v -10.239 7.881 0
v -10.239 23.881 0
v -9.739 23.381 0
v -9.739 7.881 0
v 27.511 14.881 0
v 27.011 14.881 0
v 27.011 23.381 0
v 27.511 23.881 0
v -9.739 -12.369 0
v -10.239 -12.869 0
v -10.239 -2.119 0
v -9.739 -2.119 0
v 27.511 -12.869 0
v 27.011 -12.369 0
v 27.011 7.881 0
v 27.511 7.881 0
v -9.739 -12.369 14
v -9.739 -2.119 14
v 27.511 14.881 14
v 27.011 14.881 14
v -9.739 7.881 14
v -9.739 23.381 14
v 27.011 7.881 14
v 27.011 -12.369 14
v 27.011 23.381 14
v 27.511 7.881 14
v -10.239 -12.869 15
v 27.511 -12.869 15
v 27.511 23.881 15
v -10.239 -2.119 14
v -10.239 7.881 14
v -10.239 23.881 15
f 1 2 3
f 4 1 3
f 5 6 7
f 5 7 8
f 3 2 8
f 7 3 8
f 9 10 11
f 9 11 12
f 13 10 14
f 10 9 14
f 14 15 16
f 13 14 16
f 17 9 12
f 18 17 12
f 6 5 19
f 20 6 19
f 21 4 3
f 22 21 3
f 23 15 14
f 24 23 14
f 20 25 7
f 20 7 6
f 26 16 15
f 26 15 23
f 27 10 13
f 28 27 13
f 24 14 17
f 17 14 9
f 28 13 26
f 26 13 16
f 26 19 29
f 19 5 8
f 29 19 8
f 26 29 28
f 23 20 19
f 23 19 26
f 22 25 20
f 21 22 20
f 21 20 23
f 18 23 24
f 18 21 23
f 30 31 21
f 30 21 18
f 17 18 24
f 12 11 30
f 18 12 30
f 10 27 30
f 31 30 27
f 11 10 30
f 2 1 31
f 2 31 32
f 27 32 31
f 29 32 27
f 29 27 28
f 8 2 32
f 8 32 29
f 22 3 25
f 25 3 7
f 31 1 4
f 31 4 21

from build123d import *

# Parameters (mm, degrees)
F0_W     = 37.75
F0_H     = 36.75
F1_DEPTH = 15
F3_DEPTH = 14
F4_W     = 7
F4_H     = 14
F5_DEPTH = 5
F6_W     = 10
F6_H     = 14
F7_DEPTH = 3


with BuildPart() as f1:
    # F0 (on Top) → F1 (new body)
    with BuildSketch(Plane.XY):
        with Locations((8.636272, 5.505883)):
            Rectangle(F0_W, F0_H)
    extrude(amount=F1_DEPTH)

    # F2 (on face) → F3 (cut)
    with BuildSketch(Plane(origin=(0, 0, 0), x_dir=(1, 0, 0), z_dir=(0, 0, -1))):
        Polygon((-9.738728, -23.380883), (27.011272, -23.380883), (27.011272, 5.682816), (27.011272, 8.965187), (27.011272, 12.369117), (-9.738728, 12.369117), (-9.738728, -10.72904), (-9.738728, -14.316749), align=None)
    extrude(amount=-F3_DEPTH, mode=Mode.SUBTRACT)

    # F4 (on face) → F5 (cut)
    with BuildSketch(Plane.YZ.offset(27.511272)):
        with Locations((11.380883, 7)):
            Rectangle(F4_W, F4_H)
    extrude(amount=-F5_DEPTH, mode=Mode.SUBTRACT)

    # F6 (on face) → F7 (cut)
    with BuildSketch(Plane(origin=(-10.238728, 0, 0), x_dir=(0, -1, 0), z_dir=(-1, 0, 0))):
        with Locations((-2.880883, 7)):
            Rectangle(F6_W, F6_H)
    extrude(amount=-F7_DEPTH, mode=Mode.SUBTRACT)


solid = f1.part
